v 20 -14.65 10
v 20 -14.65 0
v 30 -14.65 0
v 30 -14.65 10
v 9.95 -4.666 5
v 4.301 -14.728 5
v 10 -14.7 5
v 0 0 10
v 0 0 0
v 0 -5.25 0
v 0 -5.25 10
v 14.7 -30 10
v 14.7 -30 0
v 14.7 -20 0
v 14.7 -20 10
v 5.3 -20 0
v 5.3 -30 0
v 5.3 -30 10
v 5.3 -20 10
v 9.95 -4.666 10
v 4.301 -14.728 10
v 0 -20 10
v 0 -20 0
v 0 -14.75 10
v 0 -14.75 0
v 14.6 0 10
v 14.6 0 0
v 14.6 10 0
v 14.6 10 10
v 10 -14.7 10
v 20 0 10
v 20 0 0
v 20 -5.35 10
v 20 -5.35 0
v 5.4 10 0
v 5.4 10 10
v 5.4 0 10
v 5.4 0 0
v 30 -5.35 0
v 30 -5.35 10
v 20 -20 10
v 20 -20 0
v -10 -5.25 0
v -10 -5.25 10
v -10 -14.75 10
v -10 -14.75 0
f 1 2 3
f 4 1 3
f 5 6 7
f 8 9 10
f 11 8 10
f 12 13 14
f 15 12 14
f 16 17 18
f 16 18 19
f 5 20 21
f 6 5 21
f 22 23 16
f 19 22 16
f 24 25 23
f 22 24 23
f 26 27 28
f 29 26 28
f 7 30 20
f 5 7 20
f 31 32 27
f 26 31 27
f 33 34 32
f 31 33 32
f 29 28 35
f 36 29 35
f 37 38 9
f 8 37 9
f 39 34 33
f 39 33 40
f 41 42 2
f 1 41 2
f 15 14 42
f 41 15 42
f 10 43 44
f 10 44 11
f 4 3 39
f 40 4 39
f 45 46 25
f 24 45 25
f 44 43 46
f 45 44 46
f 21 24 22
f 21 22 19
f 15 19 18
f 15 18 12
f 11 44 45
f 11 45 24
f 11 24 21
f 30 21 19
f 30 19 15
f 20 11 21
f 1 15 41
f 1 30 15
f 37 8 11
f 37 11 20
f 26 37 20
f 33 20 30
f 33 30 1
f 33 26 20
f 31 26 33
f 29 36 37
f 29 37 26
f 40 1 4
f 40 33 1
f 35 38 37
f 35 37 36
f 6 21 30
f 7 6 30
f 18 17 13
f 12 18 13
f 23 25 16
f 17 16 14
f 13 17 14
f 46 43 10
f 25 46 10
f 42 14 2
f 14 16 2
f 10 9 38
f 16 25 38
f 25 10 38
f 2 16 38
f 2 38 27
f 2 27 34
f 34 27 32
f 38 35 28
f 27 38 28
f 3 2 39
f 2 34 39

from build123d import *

# Parameters (mm, degrees)
F0_W     = 4.6
F0_H     = 10
F0_W_2   = 10
F0_H_2   = 4.75
F0_H_3   = 4.65
F0_W_3   = 4.7
F1_DEPTH = 10
F3_DEPTH = 5


with BuildPart() as f1:
    # F0 (on Top) → F1 (new body)
    with BuildSketch(Plane.XY):
        Polygon((5.4, 0), (0, 0), (0, -5.25), (0, -10), (0, -14.75), (0, -20), (5.3, -20), (10, -20), (14.7, -20), (20, -20), (20, -14.65), (20, -10), (20, -5.35), (20, 0), (14.6, 0), (10, 0), align=None)
        with Locations((7.7, 5)):
            Rectangle(F0_W, F0_H)
        with Locations((-5, -7.625)):
            Rectangle(F0_W_2, F0_H_2)
        with Locations((12.3, 5)):
            Rectangle(F0_W, F0_H)
        with Locations((-5, -12.375)):
            Rectangle(F0_W_2, F0_H_2)
        with Locations((25, -7.675)):
            Rectangle(F0_W_2, F0_H_3)
        with Locations((7.65, -25)):
            Rectangle(F0_W_3, F0_H)
        with Locations((25, -12.325)):
            Rectangle(F0_W_2, F0_H_3)
        with Locations((12.35, -25)):
            Rectangle(F0_W_3, F0_H)
    extrude(amount=F1_DEPTH)

    # F2 (on face) → F3 (cut)
    with BuildSketch(Plane.XY.offset(10)):
        Polygon((4.301277, -14.728494), (10, -14.7), (9.949831, -4.666128), align=None)
    extrude(amount=-F3_DEPTH, mode=Mode.SUBTRACT)


solid = f1.part
